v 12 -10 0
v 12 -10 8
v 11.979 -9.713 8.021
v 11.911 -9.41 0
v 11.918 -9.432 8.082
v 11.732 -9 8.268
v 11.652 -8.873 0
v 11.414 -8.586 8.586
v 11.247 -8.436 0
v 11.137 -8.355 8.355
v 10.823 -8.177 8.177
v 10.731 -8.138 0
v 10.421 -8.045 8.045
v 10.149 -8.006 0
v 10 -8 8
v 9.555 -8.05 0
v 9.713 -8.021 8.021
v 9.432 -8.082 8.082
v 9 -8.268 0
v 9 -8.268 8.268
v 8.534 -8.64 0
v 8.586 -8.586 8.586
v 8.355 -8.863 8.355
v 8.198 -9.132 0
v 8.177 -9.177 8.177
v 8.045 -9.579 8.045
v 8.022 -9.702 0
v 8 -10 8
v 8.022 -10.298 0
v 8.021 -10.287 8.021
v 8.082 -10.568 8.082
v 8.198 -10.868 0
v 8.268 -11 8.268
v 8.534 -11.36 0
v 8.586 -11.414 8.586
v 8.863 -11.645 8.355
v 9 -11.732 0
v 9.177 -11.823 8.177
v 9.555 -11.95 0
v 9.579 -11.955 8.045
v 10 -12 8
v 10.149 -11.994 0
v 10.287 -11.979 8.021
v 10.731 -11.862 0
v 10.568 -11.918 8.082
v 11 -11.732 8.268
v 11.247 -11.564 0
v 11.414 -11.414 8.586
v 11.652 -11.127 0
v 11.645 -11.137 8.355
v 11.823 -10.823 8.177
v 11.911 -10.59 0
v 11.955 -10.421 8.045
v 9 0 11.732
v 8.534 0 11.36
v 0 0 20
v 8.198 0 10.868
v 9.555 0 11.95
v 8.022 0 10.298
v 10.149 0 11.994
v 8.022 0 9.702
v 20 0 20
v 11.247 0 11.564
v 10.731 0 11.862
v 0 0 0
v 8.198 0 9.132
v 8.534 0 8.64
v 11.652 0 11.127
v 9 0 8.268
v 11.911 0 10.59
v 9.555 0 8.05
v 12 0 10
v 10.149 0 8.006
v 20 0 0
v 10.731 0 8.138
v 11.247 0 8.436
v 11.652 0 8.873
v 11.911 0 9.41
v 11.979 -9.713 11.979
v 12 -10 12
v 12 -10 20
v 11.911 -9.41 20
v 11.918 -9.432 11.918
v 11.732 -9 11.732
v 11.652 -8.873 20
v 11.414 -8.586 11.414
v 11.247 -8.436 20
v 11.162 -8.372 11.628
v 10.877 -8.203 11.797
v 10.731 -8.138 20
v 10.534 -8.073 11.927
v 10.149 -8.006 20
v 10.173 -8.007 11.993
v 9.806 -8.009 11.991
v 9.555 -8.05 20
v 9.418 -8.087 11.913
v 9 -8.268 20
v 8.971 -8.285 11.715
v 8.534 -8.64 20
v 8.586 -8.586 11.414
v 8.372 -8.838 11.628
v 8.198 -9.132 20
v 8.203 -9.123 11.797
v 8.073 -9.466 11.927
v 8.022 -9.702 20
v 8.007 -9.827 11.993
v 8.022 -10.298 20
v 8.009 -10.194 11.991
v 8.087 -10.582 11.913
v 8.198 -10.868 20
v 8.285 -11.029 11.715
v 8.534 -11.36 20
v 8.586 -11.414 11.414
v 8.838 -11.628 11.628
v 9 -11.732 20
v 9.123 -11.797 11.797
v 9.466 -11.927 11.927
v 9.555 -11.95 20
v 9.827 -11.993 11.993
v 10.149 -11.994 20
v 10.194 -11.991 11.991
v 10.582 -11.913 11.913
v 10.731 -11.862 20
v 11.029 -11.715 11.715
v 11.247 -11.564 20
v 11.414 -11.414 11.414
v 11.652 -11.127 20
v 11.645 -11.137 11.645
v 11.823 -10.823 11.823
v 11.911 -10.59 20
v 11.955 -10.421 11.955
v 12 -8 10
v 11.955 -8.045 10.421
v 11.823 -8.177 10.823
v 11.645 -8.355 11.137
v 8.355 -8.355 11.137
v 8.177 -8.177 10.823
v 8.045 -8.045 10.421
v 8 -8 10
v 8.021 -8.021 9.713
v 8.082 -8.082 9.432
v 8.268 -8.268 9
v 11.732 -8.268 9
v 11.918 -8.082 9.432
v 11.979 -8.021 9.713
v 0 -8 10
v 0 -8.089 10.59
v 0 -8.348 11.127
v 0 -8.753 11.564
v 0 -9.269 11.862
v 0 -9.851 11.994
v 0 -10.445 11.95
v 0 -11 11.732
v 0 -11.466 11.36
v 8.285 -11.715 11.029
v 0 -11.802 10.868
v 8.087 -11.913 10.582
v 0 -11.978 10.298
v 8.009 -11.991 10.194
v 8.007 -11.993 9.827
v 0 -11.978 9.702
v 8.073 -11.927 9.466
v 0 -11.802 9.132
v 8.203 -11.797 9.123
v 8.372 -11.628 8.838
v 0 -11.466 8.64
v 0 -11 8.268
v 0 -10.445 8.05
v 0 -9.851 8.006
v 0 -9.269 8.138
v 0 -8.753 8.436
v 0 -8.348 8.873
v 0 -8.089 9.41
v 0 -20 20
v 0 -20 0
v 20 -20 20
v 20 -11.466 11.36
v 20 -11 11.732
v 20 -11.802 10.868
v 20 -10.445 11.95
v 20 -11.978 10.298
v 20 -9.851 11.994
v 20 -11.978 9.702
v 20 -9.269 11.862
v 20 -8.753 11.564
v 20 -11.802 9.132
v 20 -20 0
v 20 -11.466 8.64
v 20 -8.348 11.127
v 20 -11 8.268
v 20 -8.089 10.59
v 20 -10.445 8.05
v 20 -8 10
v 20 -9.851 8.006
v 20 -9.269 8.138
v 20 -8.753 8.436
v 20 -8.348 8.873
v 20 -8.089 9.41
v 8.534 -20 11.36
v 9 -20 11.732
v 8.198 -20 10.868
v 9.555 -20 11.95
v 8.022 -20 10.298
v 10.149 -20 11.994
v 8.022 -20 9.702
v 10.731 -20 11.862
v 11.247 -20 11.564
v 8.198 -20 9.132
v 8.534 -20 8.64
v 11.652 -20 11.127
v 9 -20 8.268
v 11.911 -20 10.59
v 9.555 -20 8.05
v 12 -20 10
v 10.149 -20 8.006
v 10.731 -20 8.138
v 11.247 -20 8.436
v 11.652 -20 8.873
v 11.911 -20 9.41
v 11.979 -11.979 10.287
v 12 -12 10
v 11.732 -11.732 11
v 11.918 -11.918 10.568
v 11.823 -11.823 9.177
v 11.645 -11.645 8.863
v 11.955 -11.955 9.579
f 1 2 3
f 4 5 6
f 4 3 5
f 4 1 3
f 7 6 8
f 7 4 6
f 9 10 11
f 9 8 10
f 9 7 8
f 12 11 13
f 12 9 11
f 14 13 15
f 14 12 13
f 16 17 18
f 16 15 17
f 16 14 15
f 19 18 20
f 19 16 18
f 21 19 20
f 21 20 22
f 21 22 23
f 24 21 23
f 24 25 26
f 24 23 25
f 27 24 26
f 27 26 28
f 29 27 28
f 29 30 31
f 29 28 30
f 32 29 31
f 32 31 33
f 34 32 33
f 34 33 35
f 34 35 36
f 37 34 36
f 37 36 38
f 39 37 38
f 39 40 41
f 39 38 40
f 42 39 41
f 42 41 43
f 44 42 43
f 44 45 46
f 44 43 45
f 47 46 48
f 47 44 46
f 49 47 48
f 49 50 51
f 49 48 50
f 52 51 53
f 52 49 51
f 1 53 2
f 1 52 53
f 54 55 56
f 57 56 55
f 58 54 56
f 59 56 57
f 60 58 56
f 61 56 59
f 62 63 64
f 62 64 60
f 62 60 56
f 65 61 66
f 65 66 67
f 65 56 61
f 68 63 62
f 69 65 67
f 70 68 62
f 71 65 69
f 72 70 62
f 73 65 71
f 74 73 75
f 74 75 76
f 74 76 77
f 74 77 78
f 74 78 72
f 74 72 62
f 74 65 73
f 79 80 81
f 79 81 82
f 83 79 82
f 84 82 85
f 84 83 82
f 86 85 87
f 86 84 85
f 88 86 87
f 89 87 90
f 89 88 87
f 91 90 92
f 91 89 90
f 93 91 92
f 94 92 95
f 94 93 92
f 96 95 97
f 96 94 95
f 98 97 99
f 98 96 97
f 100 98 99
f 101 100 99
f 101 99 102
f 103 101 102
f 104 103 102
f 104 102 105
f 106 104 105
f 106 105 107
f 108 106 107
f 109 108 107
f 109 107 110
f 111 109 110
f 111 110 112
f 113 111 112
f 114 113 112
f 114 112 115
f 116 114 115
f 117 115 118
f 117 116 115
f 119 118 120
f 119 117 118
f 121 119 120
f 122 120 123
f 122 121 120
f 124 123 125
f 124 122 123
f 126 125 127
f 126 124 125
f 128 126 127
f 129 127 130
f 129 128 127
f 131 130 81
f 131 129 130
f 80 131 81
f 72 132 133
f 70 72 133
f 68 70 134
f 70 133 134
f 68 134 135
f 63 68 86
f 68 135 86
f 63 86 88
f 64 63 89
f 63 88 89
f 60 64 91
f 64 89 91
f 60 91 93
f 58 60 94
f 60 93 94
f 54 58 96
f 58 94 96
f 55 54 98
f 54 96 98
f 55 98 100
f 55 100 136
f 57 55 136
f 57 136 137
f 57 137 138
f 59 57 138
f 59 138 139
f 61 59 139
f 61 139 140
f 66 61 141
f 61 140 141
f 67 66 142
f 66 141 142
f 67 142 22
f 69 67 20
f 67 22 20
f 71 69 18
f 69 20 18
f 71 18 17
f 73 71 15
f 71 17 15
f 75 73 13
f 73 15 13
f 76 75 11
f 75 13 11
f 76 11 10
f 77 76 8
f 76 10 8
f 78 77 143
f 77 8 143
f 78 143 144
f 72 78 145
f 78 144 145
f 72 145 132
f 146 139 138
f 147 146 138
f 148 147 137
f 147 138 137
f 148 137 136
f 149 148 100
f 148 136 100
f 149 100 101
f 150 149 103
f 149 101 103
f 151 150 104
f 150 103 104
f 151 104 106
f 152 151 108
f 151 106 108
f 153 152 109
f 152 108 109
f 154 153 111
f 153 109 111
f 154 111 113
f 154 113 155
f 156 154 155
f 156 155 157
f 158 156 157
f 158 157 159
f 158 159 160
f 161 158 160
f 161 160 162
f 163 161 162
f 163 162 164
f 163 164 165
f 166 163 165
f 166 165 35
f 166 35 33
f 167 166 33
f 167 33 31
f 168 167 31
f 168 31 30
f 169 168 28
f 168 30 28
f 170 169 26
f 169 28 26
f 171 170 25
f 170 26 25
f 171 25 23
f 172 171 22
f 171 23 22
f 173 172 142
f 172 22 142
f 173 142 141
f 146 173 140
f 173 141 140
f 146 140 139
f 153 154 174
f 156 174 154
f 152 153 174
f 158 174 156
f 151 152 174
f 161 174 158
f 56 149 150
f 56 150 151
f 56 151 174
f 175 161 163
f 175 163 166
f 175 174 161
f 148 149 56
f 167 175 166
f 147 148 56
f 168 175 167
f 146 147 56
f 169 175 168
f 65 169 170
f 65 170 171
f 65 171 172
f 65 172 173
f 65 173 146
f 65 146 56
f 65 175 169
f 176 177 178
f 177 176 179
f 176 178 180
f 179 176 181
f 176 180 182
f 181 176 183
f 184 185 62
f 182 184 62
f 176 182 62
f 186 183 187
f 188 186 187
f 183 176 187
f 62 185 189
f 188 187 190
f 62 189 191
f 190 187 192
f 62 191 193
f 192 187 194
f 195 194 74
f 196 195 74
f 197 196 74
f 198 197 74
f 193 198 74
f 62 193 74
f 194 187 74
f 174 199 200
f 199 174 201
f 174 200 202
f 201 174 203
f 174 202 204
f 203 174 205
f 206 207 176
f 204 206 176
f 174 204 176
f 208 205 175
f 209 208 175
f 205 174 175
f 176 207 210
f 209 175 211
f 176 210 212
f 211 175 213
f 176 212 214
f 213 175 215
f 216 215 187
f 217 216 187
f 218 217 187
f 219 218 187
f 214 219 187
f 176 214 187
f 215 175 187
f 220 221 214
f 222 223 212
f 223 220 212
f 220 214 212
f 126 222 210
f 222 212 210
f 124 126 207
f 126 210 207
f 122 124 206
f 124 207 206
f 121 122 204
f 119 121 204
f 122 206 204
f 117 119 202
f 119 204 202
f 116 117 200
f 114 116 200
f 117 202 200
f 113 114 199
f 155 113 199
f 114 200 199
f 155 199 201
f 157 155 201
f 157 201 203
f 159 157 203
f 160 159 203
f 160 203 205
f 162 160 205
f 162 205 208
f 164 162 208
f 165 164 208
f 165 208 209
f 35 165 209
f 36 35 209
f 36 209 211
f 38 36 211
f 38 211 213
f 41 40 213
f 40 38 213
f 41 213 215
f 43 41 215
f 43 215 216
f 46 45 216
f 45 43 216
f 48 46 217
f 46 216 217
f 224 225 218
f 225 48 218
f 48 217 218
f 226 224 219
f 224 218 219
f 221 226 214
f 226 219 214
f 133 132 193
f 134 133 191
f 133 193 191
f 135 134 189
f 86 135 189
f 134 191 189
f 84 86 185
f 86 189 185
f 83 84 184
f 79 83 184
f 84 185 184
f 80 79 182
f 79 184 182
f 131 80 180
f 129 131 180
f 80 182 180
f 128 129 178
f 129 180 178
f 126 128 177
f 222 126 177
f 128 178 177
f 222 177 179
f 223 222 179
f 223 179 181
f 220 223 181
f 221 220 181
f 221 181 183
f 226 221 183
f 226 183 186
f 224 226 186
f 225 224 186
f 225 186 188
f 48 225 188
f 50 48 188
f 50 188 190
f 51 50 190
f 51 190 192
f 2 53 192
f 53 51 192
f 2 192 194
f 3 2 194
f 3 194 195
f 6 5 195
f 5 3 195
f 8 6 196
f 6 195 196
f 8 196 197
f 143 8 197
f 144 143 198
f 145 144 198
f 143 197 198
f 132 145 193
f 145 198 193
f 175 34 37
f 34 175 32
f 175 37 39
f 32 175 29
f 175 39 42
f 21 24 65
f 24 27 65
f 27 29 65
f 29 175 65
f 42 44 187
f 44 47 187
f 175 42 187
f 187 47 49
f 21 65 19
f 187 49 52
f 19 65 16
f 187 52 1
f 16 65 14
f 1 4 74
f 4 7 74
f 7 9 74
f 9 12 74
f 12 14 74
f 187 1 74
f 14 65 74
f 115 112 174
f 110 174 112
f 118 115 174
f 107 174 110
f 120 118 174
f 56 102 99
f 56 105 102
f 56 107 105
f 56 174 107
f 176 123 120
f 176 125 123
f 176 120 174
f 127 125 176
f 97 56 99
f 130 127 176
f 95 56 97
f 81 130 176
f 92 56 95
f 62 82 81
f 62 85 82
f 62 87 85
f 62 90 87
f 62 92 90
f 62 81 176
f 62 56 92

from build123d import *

# Parameters (mm, degrees)
F0_W     = 20
F0_H     = 20
F0_R     = 2
F1_DEPTH = 20
F2_R     = 2
F3_DEPTH = 20.001
F4_R     = 2
F5_DEPTH = 20.001


with BuildPart() as f1:
    # F0 (on Top) → F1 (new body)
    with BuildSketch(Plane.XY):
        with Locations((10, -10)):
            Rectangle(F0_W, F0_H)
        with Locations((10, -10)):
            Circle(F0_R, mode=Mode.SUBTRACT)
    extrude(amount=F1_DEPTH)

    # F2 (on face) → F3 (cut, through all)
    with BuildSketch(Plane.YZ.offset(20)):
        with Locations((-10, 10)):
            Circle(F2_R)
    extrude(amount=-F3_DEPTH, mode=Mode.SUBTRACT)

    # F4 (on face) → F5 (cut, through all)
    with BuildSketch(Plane.XZ.offset(20)):
        with Locations((10, 10)):
            Circle(F4_R)
    extrude(amount=-F5_DEPTH, mode=Mode.SUBTRACT)


solid = f1.part
